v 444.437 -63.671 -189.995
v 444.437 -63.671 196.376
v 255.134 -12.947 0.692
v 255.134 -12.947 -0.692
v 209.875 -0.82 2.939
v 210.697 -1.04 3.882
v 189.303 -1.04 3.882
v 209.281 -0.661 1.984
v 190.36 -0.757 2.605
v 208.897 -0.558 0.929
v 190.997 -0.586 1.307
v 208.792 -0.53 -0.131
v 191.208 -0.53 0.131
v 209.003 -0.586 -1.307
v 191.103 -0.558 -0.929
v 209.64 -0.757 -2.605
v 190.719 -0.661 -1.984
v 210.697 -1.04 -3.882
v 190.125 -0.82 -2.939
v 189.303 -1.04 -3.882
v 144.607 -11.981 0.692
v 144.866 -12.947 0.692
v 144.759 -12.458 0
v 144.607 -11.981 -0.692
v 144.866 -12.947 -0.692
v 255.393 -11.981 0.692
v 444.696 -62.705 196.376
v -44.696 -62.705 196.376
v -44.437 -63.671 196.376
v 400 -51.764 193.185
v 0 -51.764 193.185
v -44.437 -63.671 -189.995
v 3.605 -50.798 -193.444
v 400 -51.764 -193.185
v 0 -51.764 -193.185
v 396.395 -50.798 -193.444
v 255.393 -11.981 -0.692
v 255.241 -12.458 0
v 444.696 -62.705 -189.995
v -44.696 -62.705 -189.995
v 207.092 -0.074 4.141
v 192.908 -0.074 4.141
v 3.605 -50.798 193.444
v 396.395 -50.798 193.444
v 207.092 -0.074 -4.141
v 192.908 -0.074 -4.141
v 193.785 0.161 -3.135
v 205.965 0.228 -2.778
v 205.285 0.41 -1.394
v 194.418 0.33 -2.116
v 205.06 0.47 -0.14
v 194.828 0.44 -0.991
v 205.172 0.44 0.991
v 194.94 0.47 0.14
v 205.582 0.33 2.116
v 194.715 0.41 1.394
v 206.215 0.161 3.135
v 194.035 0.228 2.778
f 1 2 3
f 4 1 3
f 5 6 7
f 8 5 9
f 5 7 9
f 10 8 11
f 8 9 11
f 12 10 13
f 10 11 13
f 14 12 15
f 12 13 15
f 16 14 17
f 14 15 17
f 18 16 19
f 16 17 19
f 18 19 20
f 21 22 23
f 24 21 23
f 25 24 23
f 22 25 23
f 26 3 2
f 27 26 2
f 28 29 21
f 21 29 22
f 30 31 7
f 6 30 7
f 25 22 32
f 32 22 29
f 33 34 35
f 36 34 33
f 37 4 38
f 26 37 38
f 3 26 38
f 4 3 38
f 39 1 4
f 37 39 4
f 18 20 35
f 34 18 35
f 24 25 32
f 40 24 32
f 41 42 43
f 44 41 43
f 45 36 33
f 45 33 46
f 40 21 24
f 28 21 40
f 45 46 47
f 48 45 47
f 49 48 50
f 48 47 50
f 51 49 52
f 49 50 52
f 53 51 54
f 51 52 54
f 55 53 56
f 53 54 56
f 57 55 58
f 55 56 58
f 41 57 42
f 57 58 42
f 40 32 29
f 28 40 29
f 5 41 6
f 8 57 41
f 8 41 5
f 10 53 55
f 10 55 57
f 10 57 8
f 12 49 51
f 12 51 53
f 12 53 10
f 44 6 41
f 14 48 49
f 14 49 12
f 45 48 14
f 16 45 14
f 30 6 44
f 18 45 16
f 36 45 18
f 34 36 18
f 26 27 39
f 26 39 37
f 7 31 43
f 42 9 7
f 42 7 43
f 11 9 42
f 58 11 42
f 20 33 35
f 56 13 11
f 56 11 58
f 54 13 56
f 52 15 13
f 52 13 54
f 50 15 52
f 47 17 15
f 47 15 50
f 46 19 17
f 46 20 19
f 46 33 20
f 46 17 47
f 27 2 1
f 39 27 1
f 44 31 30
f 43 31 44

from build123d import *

# Parameters (mm, degrees)
EXTRUSION7_DEPTH      = 400
EXTRUSION8_DEPTH      = 448.325459802
EXTRUSION8_DEPTH_BACK = 448.325459802
EXTRUSION9_DEPTH      = 1
EXTRUSION10_DEPTH     = 1


with BuildPart() as part:
    # Sketch1 → Extrusion7 (new body)
    with BuildSketch(Plane.YZ):
        with BuildLine():
            Line((-51.763809021, 193.185165258), (-1.040255312, 3.882285677))
            ThreePointArc((-1.040255312, 3.882285677), (-0.529142706, 0), (-1.040255312, -3.882285677))
            Line((-1.040255312, -3.882285677), (-51.763809021, -193.185165258))
            Line((-51.763809021, -193.185165258), (-50.797883194, -193.443984303))
            Line((-50.797883194, -193.443984303), (-0.074329486, -4.141104722))
            ThreePointArc((-0.074329486, -4.141104722), (0.470857294, 0), (-0.074329486, 4.141104722))
            Line((-0.074329486, 4.141104722), (-50.797883194, 193.443984303))
            Line((-50.797883194, 193.443984303), (-51.763809021, 193.185165258))
        make_face()
    extrude(amount=EXTRUSION7_DEPTH)

    # Sketch2 → Extrusion8 (cut, two sides: drawn at the far end of the back side and taken through both)
    with BuildSketch(Plane.XY.offset(-EXTRUSION8_DEPTH_BACK)):
        with BuildLine():
            Line((0, -51.763809021), (196.117714323, 0.785774154))
            ThreePointArc((196.117714323, 0.785774154), (200, 1.29688676), (203.882285677, 0.785774154))
            Line((203.882285677, 0.785774154), (400, -51.763809021))
            Line((400, -51.763809021), (400, 8.236190979))
            Line((400, 8.236190979), (0, 8.236190979))
            Line((0, 8.236190979), (0, -51.763809021))
        make_face()
    extrude(amount=EXTRUSION8_DEPTH + EXTRUSION8_DEPTH_BACK, mode=Mode.SUBTRACT)


with BuildPart() as body_2:
    # Sketch3 → Extrusion9 (new body)
    with BuildSketch(Plane(origin=(13.853966988, 51.703708686, 0), x_dir=(-0.9659258262890683, 0.2588190451025207, 0), z_dir=(0.2588190451025207, 0.9659258262890683, 0))):
        with BuildLine():
            Line((-445.772513214, 196.375609094), (-445.772513214, -189.994721421))
            Line((-445.772513214, -189.994721421), (-249.7917511, -0.69184184))
            add(Edge.make_bspline(
                [(-249.7917511, -0.69184184), (-249.743771624, 0), (-249.7917511, 0.69184184)],
                knots=[3.072353159, 3.072353159, 3.072353159, 3.210832148, 3.210832148, 3.210832148], degree=2, weights=[1, 0.997603904, 1]))
            Line((-249.7917511, 0.69184184), (-445.772513214, 196.375609094))
        make_face()
    extrude(amount=EXTRUSION9_DEPTH)


with BuildPart() as body_3:
    # Sketch4 → Extrusion10 (new body)
    with BuildSketch(Plane(origin=(12.940952255, -48.296291314, 0), x_dir=(-0.9659258262890683, -0.25881904510252063, 0), z_dir=(-0.25881904510252063, 0.9659258262890683, 0))):
        with BuildLine():
            Line((-136.578579415, -0.69184184), (59.402182698, -189.994721421))
            Line((59.402182698, -189.994721421), (59.402182698, 196.375609094))
            Line((59.402182698, 196.375609094), (-136.578579415, 0.69184184))
            add(Edge.make_bspline(
                [(-136.578579415, 0.69184184), (-136.626558892, 0), (-136.578579415, -0.69184184)],
                knots=[1.501556832, 1.501556832, 1.501556832, 1.640035821, 1.640035821, 1.640035821], degree=2, weights=[1, 0.997603904, 1]))
        make_face()
    extrude(amount=EXTRUSION10_DEPTH)


solid = Compound([part.part, body_2.part, body_3.part])
